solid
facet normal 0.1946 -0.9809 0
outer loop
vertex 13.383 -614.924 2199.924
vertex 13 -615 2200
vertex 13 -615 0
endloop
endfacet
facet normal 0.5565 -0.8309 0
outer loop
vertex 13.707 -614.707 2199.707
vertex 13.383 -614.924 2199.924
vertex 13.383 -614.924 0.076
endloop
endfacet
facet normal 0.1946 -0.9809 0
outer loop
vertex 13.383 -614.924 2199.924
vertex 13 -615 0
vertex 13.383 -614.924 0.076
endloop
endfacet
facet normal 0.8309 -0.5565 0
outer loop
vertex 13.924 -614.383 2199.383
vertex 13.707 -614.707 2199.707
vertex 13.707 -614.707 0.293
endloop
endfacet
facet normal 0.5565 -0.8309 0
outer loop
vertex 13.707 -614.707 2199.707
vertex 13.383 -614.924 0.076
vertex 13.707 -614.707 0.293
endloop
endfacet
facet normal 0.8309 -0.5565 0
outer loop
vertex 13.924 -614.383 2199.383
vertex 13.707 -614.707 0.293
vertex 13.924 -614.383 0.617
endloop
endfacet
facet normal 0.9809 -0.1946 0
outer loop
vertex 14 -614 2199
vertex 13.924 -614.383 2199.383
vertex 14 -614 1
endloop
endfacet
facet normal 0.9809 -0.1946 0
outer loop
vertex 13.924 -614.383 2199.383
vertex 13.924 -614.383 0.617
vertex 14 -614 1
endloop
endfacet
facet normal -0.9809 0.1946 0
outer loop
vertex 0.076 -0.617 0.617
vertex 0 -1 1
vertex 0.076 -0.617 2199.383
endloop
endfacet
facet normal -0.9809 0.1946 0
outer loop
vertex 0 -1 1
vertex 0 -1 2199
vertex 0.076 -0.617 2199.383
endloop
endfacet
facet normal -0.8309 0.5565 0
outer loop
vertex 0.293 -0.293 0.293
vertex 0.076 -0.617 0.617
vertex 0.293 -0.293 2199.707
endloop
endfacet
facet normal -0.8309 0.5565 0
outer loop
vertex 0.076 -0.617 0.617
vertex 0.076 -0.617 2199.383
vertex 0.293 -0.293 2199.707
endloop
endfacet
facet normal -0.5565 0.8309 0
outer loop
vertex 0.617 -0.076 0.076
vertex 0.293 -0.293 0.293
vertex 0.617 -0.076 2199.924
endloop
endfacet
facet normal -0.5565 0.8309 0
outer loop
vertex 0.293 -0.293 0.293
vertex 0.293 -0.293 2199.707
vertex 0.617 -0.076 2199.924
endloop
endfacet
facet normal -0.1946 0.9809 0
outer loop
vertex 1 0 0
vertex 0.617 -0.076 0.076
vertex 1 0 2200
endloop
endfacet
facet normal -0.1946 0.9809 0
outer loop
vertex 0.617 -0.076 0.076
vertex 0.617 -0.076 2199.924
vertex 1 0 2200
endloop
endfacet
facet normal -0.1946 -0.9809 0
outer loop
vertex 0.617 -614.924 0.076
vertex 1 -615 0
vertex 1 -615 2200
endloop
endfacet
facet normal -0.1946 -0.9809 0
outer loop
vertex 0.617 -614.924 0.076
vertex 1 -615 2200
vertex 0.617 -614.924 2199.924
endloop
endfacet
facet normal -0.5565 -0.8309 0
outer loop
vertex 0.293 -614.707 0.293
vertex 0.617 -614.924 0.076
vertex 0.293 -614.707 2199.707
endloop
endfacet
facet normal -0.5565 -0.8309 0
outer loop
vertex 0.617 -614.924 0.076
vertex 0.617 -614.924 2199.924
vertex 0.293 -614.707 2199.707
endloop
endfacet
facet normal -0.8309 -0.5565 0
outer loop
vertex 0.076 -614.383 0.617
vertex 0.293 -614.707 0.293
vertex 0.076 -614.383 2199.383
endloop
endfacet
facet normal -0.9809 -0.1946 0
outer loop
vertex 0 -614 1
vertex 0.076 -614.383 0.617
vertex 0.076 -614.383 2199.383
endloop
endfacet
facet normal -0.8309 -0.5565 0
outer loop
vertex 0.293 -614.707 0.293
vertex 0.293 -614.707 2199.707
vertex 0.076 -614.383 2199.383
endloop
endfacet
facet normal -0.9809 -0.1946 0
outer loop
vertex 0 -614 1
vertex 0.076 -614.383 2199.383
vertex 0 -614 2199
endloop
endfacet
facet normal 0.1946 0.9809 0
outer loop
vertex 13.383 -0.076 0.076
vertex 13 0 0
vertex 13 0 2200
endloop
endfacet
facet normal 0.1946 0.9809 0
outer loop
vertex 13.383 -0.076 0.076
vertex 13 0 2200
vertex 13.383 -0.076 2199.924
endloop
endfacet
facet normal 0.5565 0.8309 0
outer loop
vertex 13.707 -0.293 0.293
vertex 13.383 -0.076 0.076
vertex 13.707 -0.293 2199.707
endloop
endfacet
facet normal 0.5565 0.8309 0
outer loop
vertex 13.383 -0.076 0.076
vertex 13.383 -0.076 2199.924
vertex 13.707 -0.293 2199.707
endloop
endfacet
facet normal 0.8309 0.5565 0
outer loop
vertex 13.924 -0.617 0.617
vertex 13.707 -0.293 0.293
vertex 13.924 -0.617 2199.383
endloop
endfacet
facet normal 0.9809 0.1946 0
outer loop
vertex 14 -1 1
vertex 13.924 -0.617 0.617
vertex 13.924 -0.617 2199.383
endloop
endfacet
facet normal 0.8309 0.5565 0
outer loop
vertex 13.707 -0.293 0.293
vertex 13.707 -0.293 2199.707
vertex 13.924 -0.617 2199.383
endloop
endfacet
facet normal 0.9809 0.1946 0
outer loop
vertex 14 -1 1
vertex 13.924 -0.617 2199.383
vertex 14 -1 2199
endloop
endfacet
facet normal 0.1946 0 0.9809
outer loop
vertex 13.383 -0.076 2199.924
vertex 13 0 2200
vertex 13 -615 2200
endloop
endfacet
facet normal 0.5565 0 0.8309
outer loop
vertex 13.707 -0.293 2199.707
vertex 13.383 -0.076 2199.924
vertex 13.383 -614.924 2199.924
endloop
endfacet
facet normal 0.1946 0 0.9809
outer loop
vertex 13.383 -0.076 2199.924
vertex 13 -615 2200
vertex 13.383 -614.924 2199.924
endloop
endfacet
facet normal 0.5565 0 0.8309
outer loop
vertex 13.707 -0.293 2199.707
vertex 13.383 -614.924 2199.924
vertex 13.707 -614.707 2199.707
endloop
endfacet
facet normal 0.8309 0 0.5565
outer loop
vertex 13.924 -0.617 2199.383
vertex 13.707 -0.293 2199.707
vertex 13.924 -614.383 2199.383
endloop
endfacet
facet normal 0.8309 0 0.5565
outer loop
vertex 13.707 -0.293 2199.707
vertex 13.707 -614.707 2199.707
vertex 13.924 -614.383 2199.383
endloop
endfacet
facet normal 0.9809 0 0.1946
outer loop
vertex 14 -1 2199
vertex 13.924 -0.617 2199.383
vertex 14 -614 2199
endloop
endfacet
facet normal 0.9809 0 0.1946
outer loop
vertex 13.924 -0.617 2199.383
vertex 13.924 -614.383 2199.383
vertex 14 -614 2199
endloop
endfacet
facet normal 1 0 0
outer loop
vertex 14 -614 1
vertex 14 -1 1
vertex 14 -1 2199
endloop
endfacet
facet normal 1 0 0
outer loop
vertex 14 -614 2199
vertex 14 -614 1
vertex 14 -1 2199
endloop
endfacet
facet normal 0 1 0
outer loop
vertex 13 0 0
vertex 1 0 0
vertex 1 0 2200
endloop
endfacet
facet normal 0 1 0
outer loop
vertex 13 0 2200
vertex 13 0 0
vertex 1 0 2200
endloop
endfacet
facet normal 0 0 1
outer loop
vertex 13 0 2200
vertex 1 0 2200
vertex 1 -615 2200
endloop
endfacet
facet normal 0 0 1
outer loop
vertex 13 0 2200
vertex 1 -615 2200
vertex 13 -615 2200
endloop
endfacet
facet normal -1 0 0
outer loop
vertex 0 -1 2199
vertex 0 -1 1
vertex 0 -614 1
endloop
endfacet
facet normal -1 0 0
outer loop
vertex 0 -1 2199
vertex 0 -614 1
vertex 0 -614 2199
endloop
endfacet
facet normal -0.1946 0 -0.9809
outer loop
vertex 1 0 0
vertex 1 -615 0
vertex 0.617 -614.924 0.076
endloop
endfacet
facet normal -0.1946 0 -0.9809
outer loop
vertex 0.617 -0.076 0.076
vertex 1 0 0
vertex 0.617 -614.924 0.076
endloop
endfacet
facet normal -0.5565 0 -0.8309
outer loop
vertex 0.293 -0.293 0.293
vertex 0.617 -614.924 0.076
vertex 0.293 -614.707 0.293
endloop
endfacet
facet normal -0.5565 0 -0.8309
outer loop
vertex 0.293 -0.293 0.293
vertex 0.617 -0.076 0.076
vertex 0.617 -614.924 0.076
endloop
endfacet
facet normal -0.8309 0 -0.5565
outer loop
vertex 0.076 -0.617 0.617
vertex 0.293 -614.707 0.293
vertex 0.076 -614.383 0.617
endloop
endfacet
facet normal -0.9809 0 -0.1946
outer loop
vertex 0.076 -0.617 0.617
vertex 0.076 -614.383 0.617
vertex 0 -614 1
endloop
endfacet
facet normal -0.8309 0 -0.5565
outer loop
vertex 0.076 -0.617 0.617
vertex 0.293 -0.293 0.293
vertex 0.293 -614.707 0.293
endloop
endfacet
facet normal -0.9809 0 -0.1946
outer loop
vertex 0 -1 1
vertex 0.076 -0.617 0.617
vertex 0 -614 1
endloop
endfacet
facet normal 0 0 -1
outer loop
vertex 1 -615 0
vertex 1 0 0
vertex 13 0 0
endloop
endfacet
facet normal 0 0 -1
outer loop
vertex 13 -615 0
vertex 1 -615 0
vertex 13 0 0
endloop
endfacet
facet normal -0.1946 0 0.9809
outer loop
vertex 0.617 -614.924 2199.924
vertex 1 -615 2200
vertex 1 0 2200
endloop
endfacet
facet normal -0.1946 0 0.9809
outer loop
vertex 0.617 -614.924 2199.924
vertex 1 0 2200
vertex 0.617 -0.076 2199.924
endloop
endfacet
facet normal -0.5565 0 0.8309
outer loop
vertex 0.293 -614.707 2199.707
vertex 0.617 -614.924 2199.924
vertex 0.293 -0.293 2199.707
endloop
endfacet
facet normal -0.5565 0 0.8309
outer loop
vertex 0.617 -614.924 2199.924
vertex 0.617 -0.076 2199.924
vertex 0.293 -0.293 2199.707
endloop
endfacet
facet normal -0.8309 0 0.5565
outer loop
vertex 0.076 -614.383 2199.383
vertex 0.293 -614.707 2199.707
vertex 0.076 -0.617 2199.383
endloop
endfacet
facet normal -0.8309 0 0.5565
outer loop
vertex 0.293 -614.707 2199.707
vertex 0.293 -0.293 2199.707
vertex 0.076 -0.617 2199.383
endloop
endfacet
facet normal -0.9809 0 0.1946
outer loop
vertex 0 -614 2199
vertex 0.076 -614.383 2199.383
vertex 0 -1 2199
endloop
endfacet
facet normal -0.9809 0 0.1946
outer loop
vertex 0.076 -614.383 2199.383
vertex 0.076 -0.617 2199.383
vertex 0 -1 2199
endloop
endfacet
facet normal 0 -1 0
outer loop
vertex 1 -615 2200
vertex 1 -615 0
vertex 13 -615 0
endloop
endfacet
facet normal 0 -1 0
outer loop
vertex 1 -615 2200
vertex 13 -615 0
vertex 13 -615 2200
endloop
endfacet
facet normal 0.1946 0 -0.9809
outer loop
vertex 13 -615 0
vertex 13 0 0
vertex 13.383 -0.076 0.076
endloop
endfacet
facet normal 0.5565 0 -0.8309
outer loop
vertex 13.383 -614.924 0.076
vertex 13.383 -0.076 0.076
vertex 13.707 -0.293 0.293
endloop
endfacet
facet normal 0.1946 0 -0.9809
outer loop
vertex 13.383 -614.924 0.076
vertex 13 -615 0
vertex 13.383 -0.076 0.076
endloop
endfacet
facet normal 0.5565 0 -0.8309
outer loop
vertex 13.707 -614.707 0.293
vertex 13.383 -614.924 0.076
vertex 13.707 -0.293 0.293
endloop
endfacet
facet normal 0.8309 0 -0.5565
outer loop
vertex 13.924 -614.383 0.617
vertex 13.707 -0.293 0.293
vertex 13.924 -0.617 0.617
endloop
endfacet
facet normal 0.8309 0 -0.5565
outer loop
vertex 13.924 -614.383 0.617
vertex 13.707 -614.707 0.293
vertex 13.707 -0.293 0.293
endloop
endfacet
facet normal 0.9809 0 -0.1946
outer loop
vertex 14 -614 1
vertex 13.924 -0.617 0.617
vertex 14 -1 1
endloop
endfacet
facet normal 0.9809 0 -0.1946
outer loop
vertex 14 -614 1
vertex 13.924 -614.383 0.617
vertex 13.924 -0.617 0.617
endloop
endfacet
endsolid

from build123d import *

# Parameters (mm, degrees)
F0_W     = 45.3829057515
F0_H     = 30.278544873
F1_DEPTH = 14
F2_DEPTH = 615
F3_DEPTH = 2200
F4_R     = 1


with BuildPart() as f1:
    # F0 (on Right) → F1 (new body)
    with BuildSketch(Plane.YZ):
        with Locations((-22.6914528757, 15.1392724365)):
            Rectangle(F0_W, F0_H)
    extrude(amount=F1_DEPTH)

    # F2 (add): a face of the model
    f2_faces = [f1.faces().sort_by_distance(p)[0] for p in [
        (7, 0, 15.1392724365),
    ]]
    extrude(f2_faces, amount=-F2_DEPTH)

    # F3 (add): a face of the model
    f3_faces = [f1.faces().sort_by_distance(p)[0] for p in [
        (7, -307.5, 0),
    ]]
    extrude(f3_faces, amount=-F3_DEPTH)

    # F4
    f4_edges = [f1.edges().sort_by_distance(p)[0] for p in [
        (0, 0, 1100),
        (0, -307.5, 2200),
        (0, -615, 1100),
        (0, -307.5, 0),
        (14, -307.5, 0),
        (14, 0, 1100),
        (14, -307.5, 2200),
        (14, -615, 1100),
    ]]
    fillet(f4_edges, radius=F4_R)


solid = f1.part
